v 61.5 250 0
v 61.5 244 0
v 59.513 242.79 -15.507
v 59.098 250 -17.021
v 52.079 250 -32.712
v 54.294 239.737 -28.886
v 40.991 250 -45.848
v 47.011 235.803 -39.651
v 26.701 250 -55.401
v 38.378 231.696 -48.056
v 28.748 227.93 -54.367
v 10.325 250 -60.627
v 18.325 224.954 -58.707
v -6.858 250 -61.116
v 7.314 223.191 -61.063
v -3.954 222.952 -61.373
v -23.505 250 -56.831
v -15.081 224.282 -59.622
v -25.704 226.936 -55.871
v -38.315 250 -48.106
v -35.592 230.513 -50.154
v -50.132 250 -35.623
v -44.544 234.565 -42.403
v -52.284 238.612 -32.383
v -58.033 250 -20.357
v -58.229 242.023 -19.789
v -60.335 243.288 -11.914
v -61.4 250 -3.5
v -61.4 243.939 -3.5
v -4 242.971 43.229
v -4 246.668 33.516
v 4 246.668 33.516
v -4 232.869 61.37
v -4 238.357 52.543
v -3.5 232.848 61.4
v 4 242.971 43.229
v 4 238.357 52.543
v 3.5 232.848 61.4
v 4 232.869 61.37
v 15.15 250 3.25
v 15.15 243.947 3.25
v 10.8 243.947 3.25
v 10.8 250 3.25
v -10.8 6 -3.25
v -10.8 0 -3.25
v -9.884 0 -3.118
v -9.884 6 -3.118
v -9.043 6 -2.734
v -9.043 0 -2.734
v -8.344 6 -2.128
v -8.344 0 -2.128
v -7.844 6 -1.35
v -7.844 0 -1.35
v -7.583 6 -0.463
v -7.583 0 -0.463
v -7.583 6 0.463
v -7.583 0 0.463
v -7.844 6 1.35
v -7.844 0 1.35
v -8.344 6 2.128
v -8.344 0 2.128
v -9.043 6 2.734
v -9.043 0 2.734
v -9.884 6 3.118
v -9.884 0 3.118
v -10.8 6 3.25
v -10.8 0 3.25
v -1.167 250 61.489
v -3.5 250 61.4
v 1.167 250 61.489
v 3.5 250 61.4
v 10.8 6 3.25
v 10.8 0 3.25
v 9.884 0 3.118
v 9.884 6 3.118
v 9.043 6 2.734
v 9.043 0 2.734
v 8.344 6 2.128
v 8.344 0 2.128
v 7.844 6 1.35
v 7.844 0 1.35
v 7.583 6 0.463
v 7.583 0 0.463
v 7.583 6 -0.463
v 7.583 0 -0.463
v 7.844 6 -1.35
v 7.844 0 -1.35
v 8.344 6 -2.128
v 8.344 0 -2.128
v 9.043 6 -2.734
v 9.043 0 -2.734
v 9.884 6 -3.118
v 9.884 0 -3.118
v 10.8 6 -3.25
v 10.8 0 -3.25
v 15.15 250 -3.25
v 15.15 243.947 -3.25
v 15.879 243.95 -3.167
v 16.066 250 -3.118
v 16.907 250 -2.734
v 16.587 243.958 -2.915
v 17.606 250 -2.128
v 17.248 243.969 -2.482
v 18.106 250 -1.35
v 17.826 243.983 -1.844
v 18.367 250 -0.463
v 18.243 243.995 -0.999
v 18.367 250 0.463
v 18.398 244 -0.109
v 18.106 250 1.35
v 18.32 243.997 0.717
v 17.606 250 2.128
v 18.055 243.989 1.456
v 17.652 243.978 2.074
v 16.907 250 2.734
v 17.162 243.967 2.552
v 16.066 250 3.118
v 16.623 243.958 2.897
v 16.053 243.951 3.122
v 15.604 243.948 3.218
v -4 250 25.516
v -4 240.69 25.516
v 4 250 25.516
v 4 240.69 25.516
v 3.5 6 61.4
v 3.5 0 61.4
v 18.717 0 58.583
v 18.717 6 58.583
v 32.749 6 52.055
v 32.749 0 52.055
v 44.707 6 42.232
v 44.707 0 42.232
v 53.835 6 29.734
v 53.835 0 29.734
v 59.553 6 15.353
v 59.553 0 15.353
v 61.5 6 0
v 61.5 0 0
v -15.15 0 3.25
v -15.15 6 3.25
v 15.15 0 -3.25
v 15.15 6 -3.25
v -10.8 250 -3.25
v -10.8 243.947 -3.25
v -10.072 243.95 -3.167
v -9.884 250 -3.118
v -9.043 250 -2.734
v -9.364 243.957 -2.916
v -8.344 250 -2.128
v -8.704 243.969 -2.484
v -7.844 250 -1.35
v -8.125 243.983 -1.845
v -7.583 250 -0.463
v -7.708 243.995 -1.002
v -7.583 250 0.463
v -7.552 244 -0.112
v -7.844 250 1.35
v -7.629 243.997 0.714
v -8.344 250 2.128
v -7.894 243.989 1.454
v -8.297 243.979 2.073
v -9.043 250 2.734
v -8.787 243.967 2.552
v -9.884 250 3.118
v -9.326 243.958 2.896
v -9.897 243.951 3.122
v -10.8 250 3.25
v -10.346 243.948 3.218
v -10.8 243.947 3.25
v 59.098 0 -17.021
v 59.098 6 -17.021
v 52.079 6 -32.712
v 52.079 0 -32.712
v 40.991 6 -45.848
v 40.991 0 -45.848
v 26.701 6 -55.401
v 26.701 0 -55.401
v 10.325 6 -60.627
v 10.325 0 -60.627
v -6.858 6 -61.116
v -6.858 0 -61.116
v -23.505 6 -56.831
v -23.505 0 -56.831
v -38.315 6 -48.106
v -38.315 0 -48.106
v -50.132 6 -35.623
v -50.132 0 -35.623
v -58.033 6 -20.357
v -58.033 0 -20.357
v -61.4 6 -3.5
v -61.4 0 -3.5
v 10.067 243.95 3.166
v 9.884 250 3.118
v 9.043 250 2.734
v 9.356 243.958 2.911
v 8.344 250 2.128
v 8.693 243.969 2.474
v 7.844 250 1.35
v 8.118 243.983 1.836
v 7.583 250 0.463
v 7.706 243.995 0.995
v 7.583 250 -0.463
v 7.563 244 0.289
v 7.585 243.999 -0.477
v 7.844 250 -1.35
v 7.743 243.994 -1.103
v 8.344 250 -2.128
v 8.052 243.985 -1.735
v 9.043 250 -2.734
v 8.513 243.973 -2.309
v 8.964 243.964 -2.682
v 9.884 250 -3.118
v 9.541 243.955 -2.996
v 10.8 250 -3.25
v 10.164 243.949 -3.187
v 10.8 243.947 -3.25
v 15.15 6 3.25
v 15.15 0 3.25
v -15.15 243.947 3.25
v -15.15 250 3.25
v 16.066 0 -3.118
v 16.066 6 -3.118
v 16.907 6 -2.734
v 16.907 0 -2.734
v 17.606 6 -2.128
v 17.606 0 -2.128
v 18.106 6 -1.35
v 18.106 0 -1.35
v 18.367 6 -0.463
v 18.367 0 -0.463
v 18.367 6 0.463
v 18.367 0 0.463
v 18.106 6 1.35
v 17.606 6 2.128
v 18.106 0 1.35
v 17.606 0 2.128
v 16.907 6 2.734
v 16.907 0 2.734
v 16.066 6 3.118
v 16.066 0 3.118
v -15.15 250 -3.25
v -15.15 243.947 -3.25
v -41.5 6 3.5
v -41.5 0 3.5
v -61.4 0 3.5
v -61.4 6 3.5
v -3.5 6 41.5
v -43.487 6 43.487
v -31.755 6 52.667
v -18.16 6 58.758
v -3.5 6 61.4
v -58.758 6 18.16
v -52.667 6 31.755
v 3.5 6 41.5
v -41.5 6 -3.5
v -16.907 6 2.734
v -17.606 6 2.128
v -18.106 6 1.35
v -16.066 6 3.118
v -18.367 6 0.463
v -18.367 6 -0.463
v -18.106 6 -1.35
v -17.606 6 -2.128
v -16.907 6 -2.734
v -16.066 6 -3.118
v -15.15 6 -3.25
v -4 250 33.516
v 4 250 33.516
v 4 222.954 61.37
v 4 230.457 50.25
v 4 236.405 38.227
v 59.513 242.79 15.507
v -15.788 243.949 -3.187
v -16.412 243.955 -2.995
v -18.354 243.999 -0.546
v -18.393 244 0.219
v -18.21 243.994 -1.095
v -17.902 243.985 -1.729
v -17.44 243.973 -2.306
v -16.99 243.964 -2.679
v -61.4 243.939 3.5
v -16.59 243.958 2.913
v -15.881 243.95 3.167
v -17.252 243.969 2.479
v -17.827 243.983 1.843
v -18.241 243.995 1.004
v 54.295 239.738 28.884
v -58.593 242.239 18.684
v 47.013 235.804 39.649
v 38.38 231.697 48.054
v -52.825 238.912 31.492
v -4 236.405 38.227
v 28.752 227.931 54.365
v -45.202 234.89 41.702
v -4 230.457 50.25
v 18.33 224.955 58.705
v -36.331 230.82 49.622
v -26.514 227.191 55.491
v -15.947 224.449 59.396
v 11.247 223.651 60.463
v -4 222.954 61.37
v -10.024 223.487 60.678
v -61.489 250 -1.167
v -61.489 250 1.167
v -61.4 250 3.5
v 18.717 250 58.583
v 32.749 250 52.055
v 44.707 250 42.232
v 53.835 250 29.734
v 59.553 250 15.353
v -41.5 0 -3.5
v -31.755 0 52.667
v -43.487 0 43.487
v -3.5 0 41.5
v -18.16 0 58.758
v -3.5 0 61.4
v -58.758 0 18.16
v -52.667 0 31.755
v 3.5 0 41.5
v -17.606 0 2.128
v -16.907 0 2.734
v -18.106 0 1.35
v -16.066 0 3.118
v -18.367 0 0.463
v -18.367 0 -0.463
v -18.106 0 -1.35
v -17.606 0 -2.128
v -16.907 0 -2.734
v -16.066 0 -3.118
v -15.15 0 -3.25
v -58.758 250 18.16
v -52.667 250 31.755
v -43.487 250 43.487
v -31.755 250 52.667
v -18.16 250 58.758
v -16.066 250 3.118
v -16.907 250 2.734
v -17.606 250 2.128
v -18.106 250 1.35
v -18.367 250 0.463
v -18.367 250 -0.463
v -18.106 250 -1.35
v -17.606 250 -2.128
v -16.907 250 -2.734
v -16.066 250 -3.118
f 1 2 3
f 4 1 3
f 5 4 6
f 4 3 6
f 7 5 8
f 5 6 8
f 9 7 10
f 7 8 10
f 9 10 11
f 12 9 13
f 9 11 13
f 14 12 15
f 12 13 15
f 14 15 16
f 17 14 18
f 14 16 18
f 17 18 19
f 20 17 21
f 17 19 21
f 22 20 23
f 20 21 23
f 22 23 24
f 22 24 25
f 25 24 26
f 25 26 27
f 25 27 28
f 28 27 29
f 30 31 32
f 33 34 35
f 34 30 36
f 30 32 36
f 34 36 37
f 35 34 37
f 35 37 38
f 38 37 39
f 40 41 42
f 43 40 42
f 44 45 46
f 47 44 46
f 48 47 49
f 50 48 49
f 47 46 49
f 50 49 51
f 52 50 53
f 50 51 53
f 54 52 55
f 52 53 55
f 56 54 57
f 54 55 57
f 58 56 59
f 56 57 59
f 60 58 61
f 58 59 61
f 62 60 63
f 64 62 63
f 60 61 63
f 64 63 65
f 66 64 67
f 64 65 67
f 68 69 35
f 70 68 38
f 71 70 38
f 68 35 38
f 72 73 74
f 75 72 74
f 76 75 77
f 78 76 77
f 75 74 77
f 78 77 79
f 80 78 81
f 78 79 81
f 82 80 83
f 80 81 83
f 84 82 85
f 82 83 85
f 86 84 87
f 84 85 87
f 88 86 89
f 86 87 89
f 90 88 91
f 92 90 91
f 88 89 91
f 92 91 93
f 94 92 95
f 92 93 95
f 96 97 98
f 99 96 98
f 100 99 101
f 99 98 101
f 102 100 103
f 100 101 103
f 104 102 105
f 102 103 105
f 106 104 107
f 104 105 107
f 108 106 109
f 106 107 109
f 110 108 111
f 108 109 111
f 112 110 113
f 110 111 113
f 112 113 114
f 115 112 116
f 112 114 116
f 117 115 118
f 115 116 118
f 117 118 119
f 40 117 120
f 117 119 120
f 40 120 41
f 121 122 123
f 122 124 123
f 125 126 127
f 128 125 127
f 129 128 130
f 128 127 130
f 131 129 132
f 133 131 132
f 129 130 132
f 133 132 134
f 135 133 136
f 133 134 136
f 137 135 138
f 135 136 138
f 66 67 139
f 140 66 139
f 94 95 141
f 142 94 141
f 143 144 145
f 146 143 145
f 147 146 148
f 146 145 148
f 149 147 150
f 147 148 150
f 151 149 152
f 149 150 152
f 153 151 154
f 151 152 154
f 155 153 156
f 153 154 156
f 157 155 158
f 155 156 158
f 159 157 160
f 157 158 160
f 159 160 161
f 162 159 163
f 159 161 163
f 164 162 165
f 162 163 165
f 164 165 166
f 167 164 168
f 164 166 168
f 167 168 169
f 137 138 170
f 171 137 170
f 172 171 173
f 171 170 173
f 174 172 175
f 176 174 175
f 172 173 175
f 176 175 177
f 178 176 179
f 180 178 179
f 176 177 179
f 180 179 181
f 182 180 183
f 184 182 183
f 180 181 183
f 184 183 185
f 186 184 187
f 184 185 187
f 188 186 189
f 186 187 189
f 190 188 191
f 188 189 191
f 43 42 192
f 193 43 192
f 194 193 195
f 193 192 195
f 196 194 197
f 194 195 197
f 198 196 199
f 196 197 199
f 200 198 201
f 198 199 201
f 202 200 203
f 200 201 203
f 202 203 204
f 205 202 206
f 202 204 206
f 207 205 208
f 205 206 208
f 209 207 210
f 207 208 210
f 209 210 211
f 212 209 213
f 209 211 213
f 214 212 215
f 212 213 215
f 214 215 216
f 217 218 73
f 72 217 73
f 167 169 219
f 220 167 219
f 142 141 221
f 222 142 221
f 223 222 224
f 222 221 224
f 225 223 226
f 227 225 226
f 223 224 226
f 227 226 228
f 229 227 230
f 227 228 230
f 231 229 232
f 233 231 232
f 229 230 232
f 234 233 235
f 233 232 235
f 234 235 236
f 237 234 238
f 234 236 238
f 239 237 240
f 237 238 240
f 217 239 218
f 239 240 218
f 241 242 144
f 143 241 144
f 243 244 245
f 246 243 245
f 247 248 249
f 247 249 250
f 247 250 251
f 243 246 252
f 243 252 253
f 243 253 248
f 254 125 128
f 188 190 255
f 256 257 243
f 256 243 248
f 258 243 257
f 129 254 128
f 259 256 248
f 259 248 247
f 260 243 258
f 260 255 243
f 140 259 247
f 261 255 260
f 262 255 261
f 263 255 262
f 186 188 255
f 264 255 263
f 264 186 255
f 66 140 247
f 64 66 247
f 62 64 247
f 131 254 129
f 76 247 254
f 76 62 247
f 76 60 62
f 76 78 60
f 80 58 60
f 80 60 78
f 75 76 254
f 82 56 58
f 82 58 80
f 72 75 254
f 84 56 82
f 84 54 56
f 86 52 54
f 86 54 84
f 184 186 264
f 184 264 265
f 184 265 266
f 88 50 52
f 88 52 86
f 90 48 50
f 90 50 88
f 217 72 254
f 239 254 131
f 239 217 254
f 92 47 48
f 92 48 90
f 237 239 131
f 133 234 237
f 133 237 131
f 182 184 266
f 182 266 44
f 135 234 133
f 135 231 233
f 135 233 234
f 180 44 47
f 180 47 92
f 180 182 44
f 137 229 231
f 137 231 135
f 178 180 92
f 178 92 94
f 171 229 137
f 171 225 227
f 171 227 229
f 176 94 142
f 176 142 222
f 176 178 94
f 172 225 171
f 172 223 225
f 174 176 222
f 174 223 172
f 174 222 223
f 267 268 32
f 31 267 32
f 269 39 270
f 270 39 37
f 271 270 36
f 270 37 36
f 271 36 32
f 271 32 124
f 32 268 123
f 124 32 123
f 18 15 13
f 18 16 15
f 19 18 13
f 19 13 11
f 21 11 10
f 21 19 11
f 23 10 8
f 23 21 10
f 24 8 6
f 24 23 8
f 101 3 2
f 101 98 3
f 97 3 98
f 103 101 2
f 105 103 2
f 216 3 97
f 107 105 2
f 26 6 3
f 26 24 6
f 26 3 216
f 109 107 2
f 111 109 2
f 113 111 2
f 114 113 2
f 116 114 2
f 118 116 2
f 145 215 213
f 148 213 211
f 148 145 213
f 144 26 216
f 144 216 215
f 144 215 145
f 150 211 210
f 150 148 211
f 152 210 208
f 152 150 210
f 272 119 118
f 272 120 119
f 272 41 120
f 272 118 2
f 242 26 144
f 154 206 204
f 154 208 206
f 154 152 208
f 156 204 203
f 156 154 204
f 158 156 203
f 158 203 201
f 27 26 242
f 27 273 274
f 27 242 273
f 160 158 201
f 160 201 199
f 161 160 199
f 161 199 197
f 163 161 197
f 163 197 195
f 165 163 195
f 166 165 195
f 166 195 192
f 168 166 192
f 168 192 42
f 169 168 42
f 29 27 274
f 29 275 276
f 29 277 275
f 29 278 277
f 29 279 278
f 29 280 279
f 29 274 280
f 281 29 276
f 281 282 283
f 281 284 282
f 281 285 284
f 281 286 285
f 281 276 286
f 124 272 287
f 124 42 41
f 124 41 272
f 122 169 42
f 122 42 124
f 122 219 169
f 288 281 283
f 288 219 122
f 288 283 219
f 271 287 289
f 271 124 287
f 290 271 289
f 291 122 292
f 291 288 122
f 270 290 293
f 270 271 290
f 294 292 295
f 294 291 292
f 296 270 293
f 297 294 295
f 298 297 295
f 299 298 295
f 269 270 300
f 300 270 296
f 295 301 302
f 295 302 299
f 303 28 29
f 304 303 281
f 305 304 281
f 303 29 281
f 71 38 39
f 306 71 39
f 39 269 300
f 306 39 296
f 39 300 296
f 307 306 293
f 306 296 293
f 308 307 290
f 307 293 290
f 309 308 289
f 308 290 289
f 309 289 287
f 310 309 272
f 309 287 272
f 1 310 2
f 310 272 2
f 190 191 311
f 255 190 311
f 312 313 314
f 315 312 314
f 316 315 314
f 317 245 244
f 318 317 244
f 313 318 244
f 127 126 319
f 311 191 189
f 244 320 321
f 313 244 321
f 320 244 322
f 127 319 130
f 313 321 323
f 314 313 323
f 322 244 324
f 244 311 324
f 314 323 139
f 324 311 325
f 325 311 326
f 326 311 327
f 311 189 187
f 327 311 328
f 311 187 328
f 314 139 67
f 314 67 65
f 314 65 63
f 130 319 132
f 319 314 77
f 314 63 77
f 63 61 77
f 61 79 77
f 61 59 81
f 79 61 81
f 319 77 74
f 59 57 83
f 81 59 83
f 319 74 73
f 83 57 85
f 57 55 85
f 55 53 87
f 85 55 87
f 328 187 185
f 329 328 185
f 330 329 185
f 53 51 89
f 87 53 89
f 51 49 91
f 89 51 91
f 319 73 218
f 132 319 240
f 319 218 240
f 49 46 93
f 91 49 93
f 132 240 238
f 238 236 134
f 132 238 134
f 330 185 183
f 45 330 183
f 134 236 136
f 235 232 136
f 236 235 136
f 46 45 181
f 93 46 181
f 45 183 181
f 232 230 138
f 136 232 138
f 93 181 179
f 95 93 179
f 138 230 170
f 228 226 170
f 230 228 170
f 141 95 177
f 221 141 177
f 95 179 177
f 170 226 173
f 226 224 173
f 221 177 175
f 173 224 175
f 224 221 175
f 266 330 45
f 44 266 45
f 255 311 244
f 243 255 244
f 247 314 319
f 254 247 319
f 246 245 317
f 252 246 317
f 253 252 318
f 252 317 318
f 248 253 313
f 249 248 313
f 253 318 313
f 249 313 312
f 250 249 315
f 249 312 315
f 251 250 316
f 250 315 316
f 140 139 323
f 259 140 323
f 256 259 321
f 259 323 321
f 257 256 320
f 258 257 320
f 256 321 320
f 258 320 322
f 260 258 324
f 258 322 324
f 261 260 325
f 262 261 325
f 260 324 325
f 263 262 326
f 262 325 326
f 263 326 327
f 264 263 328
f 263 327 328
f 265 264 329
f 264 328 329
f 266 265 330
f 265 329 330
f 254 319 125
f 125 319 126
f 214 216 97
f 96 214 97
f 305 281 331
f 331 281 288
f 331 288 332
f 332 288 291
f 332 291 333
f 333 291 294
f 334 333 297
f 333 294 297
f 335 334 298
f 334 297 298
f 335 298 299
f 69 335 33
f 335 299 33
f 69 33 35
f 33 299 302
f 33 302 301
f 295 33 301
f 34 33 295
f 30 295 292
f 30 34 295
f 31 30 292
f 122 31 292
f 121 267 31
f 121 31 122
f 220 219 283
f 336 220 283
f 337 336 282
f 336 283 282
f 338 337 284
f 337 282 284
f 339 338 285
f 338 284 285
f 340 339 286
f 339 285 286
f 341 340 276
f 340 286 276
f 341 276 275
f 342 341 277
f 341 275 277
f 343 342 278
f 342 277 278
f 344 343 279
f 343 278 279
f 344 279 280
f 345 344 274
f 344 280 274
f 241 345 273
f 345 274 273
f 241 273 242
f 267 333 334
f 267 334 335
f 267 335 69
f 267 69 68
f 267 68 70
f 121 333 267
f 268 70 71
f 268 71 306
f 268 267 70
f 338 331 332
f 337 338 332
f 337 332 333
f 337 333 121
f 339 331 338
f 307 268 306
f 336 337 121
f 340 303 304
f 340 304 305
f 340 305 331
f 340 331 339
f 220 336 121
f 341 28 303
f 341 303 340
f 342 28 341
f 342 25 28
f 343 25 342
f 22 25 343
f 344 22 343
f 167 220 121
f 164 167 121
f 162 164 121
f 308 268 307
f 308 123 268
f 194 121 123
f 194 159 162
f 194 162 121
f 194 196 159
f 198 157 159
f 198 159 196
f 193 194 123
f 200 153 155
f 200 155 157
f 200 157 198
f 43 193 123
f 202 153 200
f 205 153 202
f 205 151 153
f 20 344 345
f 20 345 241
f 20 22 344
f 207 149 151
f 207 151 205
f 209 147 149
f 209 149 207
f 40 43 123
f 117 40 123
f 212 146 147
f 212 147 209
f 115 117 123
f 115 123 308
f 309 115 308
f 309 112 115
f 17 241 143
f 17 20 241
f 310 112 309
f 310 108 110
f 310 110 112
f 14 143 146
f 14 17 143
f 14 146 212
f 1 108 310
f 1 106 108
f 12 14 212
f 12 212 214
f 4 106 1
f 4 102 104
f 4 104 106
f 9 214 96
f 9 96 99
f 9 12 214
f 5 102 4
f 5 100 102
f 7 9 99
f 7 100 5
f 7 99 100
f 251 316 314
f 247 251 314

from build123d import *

# Parameters (mm, degrees)
EXTRUDE_1_DEPTH          = 6
EXTRUDE_START            = 150
SKETCH_1_3_R             = 61.5
EXTRUDE_2_DEPTH          = 100
CUT_EXTRUDE_1_DEPTH      = 265.696996583
CUT_EXTRUDE_1_DEPTH_BACK = 265.696996583
CUT_EXTRUDE_2_DEPTH      = 4


with BuildPart() as part:
    # Эскиз1 → Бобышка-Вытянуть1 (new body)
    with BuildSketch(Plane(origin=(0, 0, 0), x_dir=(1, 0, 0), z_dir=(0, 1, 0))):
        with BuildLine():
            ThreePointArc((-61.400325732, -3.5), (-43.487067043, -43.487067043), (-3.5, -61.400325732))
            Line((-3.5, -61.400325732), (-3.5, -41.5))
            Line((-3.5, -41.5), (3.5, -41.5))
            Line((3.5, -41.5), (3.5, -61.400325732))
            ThreePointArc((3.5, -61.400325732), (44.707381941, -42.231504828), (61.5, 0))
            ThreePointArc((61.5, 0), (1.750709496, 61.475076383), (-61.400325732, 3.5))
            Line((-61.400325732, 3.5), (-41.5, 3.5))
            Line((-41.5, 3.5), (-41.5, -3.5))
            Line((-41.5, -3.5), (-61.400325732, -3.5))
        make_face()
        with BuildLine():
            ThreePointArc((-15.15, -3.25), (-18.4, 0), (-15.15, 3.25))
            Line((-15.15, 3.25), (-10.8, 3.25))
            ThreePointArc((-10.8, 3.25), (-7.55, 0), (-10.8, -3.25))
            Line((-10.8, -3.25), (-15.15, -3.25))
        make_face(mode=Mode.SUBTRACT)
        with BuildLine():
            Line((10.8, 3.25), (15.15, 3.25))
            ThreePointArc((15.15, 3.25), (18.4, 0), (15.15, -3.25))
            Line((15.15, -3.25), (10.8, -3.25))
            ThreePointArc((10.8, -3.25), (7.55, 0), (10.8, 3.25))
        make_face(mode=Mode.SUBTRACT)
    extrude(amount=EXTRUDE_1_DEPTH)


with BuildPart() as body_2:
    # Эскиз1<3> → Бобышка-Вытянуть2 (new body)
    with BuildSketch(Plane(origin=(0, 0, 0), x_dir=(1, 0, 0), z_dir=(0, 1, 0)).offset(EXTRUDE_START)):
        Circle(SKETCH_1_3_R)
        with BuildLine():
            ThreePointArc((-15.15, -3.25), (-18.4, 0), (-15.15, 3.25))
            Line((-15.15, 3.25), (-10.8, 3.25))
            ThreePointArc((-10.8, 3.25), (-7.55, 0), (-10.8, -3.25))
            Line((-10.8, -3.25), (-15.15, -3.25))
        make_face(mode=Mode.SUBTRACT)
        with BuildLine():
            Line((10.8, 3.25), (15.15, 3.25))
            ThreePointArc((15.15, 3.25), (18.4, 0), (15.15, -3.25))
            Line((15.15, -3.25), (10.8, -3.25))
            ThreePointArc((10.8, -3.25), (7.55, 0), (10.8, 3.25))
        make_face(mode=Mode.SUBTRACT)
    extrude(amount=EXTRUDE_2_DEPTH)

    # Эскиз3 → Вырез-Вытянуть1 (cut, two sides: drawn at the far end of the back side and taken through both)
    with BuildSketch(Plane(origin=(0, 0, 0), x_dir=(0, 0, -1), z_dir=(1, 0, 0)).offset(-CUT_EXTRUDE_1_DEPTH_BACK)):
        with BuildLine():
            ThreePointArc((100, 144), (61.026381005, 223.219825936), (-25.515616428, 240.689985615))
            ThreePointArc((-25.515616428, 240.689985615), (-44.412514777, 233.596476109), (-61.5, 222.852710797))
            ThreePointArc((-61.5, 222.852710797), (-43.874821937, 54.138996222), (100, 144))
        make_face()
    extrude(amount=CUT_EXTRUDE_1_DEPTH + CUT_EXTRUDE_1_DEPTH_BACK, mode=Mode.SUBTRACT)

    # Эскиз3<3> → Вырез-Вытянуть2 (cut, symmetric)
    with BuildSketch(Plane(origin=(0, 0, 0), x_dir=(0, 0, -1), z_dir=(1, 0, 0))):
        with BuildLine():
            Line((-25.515616428, 240.689985615), (-25.515616428, 250))
            Line((-25.515616428, 250), (-33.515616428, 250))
            Line((-33.515616428, 250), (-33.515616428, 246.667928076))
            ThreePointArc((-33.515616428, 246.667928076), (-48.012663856, 240.740808915), (-61.5, 232.779220542))
            Line((-61.5, 232.779220542), (-61.5, 222.852710797))
            ThreePointArc((-61.5, 222.852710797), (-44.412514777, 233.596476109), (-25.515616428, 240.689985615))
        make_face()
    extrude(amount=CUT_EXTRUDE_2_DEPTH, both=True, mode=Mode.SUBTRACT)


solid = Compound([part.part, body_2.part])
